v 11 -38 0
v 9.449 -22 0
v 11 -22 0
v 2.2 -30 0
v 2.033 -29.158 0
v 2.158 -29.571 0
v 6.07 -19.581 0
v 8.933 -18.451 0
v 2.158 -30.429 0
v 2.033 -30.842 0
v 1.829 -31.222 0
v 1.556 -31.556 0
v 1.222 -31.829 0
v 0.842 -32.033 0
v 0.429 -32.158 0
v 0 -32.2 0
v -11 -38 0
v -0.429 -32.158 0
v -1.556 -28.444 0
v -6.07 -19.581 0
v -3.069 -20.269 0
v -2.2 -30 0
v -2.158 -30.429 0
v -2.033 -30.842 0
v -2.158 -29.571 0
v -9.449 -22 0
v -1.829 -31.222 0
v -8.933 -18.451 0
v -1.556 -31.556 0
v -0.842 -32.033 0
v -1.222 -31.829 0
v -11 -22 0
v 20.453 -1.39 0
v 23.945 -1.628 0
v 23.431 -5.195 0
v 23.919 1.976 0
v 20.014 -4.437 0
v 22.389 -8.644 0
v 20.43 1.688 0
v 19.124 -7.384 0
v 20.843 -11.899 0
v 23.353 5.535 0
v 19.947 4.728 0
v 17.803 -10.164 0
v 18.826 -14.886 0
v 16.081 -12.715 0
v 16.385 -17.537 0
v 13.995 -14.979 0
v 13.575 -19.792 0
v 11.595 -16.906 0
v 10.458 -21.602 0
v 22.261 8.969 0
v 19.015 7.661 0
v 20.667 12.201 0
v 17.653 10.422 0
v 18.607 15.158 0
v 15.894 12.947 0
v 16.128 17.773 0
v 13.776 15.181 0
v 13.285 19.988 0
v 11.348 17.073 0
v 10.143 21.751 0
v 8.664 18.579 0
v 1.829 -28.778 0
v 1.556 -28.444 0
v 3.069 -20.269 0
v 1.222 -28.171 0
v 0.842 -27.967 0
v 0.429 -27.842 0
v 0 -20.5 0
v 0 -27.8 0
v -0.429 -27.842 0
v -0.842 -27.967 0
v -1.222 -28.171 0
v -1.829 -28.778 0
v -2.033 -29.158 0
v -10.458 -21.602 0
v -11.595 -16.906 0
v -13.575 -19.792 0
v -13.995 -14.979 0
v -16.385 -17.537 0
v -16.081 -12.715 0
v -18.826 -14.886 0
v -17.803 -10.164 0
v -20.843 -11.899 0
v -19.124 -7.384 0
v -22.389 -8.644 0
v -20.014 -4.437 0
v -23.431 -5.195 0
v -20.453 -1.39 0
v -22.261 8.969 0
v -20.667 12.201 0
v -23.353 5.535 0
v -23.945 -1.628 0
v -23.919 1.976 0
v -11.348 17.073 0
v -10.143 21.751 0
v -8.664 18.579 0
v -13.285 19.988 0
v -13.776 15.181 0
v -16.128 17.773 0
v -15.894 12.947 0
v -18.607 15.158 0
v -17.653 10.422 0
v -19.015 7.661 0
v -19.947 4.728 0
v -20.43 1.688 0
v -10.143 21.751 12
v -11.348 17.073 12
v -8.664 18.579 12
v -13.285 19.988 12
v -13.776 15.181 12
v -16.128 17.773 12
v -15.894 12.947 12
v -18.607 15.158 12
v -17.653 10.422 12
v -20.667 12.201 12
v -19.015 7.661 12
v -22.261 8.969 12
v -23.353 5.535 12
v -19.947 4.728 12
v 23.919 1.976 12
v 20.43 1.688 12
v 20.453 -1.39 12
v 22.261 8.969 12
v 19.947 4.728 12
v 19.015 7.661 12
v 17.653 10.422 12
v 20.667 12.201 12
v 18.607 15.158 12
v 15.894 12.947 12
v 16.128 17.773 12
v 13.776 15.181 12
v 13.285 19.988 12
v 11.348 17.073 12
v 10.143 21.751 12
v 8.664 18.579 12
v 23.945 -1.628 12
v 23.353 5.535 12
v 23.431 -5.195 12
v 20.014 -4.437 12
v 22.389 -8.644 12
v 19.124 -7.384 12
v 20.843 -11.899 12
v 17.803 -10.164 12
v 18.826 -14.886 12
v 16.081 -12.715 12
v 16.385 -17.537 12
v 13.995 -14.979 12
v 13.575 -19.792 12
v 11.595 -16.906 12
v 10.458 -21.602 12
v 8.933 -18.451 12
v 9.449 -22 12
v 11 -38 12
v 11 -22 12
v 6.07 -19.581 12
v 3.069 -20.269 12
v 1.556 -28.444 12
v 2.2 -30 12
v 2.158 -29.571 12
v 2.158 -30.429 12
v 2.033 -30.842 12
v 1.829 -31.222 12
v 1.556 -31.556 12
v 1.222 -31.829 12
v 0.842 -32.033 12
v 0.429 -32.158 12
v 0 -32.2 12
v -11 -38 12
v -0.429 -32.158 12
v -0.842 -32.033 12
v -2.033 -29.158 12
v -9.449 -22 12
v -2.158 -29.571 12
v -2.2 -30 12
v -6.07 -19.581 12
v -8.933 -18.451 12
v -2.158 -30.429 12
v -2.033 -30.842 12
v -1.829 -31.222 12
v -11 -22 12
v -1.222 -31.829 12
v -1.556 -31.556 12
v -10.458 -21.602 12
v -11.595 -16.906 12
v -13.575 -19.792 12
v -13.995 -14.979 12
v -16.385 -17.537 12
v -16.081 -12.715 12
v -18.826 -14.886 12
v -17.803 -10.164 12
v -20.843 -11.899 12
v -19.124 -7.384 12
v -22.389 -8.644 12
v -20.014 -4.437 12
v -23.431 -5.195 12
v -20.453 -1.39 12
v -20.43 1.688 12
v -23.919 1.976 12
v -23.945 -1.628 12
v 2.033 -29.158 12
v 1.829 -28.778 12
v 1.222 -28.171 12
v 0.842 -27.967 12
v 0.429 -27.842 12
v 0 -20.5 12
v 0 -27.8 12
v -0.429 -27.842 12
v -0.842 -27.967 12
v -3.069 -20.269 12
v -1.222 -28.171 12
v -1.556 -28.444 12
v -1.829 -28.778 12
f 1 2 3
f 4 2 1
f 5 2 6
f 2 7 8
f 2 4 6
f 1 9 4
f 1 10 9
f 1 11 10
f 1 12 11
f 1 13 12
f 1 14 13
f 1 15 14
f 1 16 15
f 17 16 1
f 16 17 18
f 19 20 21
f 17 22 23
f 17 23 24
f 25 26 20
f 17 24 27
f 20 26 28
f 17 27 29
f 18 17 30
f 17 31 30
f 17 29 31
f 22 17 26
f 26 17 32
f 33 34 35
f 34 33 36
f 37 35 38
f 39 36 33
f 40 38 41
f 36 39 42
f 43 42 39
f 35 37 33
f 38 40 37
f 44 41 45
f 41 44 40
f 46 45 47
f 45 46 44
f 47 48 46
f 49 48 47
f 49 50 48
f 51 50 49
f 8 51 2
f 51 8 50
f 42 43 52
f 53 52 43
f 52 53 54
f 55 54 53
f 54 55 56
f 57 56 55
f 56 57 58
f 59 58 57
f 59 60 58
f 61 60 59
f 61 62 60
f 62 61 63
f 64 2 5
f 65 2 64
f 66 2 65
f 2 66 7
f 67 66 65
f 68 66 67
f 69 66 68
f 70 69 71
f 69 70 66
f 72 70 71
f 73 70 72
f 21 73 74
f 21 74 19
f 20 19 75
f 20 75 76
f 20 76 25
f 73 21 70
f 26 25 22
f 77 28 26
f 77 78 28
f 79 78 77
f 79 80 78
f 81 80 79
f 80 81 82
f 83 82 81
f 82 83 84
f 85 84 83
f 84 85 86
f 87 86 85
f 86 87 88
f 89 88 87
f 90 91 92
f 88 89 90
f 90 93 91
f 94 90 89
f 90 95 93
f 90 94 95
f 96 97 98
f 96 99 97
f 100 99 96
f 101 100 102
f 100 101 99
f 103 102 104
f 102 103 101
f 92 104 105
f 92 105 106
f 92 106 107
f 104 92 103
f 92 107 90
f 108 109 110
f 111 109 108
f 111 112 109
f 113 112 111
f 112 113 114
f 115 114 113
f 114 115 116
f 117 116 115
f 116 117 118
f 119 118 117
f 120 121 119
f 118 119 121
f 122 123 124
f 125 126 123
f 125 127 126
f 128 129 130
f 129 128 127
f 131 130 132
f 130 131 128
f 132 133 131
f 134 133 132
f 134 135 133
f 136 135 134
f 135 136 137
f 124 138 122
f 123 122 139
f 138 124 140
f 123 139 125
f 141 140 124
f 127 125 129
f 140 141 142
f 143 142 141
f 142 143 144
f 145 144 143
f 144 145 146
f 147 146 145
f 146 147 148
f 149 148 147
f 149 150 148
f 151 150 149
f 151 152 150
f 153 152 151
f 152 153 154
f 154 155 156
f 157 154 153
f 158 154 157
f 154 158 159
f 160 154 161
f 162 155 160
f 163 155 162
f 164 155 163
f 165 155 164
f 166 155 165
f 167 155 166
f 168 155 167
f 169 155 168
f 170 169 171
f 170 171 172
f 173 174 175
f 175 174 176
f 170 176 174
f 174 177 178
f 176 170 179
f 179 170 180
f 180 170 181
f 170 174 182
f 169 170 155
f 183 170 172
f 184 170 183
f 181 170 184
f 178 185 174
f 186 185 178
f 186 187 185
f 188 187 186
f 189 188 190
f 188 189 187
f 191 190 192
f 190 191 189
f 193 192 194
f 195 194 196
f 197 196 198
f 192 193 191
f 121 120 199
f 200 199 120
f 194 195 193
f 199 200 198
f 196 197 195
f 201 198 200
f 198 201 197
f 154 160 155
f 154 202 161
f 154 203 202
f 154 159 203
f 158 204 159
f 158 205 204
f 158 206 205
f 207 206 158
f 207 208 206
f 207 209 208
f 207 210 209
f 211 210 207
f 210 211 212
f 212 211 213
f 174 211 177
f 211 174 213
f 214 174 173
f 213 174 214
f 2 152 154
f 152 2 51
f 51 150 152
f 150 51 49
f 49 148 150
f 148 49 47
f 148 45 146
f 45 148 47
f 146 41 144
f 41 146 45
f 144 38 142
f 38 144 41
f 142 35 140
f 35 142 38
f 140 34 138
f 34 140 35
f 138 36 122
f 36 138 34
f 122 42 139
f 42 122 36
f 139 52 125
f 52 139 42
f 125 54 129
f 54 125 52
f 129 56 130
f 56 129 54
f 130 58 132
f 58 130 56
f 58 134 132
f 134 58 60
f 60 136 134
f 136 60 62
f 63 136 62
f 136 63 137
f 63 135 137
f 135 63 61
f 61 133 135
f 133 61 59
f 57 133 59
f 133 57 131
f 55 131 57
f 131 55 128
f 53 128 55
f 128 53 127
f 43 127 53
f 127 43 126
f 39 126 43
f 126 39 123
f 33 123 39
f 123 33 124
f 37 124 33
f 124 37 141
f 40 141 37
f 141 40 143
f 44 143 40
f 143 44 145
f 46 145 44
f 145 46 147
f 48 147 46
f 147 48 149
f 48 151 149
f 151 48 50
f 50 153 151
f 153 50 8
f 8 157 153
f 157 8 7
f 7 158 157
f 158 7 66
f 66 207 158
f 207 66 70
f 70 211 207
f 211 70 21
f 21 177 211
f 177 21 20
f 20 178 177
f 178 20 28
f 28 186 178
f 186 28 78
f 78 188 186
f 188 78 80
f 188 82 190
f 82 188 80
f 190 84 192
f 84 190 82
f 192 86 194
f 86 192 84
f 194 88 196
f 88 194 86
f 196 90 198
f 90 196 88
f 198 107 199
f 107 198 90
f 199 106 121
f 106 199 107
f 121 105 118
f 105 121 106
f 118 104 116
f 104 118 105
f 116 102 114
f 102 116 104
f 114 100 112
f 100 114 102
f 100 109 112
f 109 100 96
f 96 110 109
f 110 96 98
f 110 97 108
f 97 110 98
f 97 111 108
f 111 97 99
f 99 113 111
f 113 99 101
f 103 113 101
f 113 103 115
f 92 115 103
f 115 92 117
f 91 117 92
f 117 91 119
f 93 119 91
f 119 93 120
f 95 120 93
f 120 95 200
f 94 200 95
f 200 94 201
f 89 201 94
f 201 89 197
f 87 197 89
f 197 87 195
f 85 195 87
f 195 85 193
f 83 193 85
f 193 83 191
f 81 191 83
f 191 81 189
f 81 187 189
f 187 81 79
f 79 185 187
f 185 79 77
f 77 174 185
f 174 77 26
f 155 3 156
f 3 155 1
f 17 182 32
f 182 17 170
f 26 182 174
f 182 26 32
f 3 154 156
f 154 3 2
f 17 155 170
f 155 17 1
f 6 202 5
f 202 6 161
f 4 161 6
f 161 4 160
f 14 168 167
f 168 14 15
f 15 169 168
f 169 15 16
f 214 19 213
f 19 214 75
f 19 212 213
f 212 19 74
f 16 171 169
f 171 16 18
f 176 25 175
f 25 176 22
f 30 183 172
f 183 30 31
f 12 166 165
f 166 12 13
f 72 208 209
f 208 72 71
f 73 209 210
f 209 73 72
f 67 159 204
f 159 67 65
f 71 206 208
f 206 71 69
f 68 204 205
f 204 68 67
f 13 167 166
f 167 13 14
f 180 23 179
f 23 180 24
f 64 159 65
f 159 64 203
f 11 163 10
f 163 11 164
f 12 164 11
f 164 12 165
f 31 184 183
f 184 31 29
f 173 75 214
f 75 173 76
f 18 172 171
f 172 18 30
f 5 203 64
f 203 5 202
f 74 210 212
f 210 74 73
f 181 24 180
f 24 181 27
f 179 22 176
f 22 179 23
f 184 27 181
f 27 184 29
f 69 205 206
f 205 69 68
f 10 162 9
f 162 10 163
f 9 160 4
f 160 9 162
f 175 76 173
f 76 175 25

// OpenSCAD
$fn = 32;

// ----------------------------------------------------------------------
// Spring clip: 48 mm outside, 3.5 mm band, 50 degree opening
// ----------------------------------------------------------------------

// --- parameters (mm) ---
outer_r = 24;             // clip outside radius
inner_r = 20.5;           // clip bore radius
band = 3.5;               // band thickness
clip_w = 12;              // clip width
opening = 50;             // opening angle
tab_w = 22;               // tab width
tab_len = 14;             // tab length past the clip
tab_hole = 4.4;           // tab fixing hole

clip_profile = [[-10.143, 21.751], [-13.285, 19.988], [-16.128, 17.773], [-18.607, 15.158], [-20.667, 12.201], [-22.261, 8.969], [-23.353, 5.535], [-23.919, 1.976], [-23.945, -1.628], [-23.431, -5.195], [-22.389, -8.644], [-20.843, -11.899], [-18.826, -14.886], [-16.385, -17.537], [-13.575, -19.792], [-10.458, -21.602], [-7.106, -22.924], [-3.593, -23.729], [0, -24], [3.593, -23.729], [7.106, -22.924], [10.458, -21.602], [13.575, -19.792], [16.385, -17.537], [18.826, -14.886], [20.843, -11.899], [22.389, -8.644], [23.431, -5.195], [23.945, -1.628], [23.919, 1.976], [23.353, 5.535], [22.261, 8.969], [20.667, 12.201], [18.607, 15.158], [16.128, 17.773], [13.285, 19.988], [10.143, 21.751], [8.664, 18.579], [11.348, 17.073], [13.776, 15.181], [15.894, 12.947], [17.653, 10.422], [19.015, 7.661], [19.947, 4.728], [20.43, 1.688], [20.453, -1.39], [20.014, -4.437], [19.124, -7.384], [17.803, -10.164], [16.081, -12.715], [13.995, -14.979], [11.595, -16.906], [8.933, -18.451], [6.07, -19.581], [3.069, -20.269], [0, -20.5], [-3.069, -20.269], [-6.07, -19.581], [-8.933, -18.451], [-11.595, -16.906], [-13.995, -14.979], [-16.081, -12.715], [-17.803, -10.164], [-19.124, -7.384], [-20.014, -4.437], [-20.453, -1.39], [-20.43, 1.688], [-19.947, 4.728], [-19.015, 7.661], [-17.653, 10.422], [-15.894, 12.947], [-13.776, 15.181], [-11.348, 17.073], [-8.664, 18.579]];

difference() {
  union() {
    linear_extrude(height = clip_w) polygon(clip_profile);
    /* mounting tab, sunk 2 mm into the band */
    translate([-11, -38, 0]) cube([tab_w, 16, clip_w]);
  }
  translate([0, -30, -2.5]) cylinder(h = clip_w + 5, d = tab_hole);
}
